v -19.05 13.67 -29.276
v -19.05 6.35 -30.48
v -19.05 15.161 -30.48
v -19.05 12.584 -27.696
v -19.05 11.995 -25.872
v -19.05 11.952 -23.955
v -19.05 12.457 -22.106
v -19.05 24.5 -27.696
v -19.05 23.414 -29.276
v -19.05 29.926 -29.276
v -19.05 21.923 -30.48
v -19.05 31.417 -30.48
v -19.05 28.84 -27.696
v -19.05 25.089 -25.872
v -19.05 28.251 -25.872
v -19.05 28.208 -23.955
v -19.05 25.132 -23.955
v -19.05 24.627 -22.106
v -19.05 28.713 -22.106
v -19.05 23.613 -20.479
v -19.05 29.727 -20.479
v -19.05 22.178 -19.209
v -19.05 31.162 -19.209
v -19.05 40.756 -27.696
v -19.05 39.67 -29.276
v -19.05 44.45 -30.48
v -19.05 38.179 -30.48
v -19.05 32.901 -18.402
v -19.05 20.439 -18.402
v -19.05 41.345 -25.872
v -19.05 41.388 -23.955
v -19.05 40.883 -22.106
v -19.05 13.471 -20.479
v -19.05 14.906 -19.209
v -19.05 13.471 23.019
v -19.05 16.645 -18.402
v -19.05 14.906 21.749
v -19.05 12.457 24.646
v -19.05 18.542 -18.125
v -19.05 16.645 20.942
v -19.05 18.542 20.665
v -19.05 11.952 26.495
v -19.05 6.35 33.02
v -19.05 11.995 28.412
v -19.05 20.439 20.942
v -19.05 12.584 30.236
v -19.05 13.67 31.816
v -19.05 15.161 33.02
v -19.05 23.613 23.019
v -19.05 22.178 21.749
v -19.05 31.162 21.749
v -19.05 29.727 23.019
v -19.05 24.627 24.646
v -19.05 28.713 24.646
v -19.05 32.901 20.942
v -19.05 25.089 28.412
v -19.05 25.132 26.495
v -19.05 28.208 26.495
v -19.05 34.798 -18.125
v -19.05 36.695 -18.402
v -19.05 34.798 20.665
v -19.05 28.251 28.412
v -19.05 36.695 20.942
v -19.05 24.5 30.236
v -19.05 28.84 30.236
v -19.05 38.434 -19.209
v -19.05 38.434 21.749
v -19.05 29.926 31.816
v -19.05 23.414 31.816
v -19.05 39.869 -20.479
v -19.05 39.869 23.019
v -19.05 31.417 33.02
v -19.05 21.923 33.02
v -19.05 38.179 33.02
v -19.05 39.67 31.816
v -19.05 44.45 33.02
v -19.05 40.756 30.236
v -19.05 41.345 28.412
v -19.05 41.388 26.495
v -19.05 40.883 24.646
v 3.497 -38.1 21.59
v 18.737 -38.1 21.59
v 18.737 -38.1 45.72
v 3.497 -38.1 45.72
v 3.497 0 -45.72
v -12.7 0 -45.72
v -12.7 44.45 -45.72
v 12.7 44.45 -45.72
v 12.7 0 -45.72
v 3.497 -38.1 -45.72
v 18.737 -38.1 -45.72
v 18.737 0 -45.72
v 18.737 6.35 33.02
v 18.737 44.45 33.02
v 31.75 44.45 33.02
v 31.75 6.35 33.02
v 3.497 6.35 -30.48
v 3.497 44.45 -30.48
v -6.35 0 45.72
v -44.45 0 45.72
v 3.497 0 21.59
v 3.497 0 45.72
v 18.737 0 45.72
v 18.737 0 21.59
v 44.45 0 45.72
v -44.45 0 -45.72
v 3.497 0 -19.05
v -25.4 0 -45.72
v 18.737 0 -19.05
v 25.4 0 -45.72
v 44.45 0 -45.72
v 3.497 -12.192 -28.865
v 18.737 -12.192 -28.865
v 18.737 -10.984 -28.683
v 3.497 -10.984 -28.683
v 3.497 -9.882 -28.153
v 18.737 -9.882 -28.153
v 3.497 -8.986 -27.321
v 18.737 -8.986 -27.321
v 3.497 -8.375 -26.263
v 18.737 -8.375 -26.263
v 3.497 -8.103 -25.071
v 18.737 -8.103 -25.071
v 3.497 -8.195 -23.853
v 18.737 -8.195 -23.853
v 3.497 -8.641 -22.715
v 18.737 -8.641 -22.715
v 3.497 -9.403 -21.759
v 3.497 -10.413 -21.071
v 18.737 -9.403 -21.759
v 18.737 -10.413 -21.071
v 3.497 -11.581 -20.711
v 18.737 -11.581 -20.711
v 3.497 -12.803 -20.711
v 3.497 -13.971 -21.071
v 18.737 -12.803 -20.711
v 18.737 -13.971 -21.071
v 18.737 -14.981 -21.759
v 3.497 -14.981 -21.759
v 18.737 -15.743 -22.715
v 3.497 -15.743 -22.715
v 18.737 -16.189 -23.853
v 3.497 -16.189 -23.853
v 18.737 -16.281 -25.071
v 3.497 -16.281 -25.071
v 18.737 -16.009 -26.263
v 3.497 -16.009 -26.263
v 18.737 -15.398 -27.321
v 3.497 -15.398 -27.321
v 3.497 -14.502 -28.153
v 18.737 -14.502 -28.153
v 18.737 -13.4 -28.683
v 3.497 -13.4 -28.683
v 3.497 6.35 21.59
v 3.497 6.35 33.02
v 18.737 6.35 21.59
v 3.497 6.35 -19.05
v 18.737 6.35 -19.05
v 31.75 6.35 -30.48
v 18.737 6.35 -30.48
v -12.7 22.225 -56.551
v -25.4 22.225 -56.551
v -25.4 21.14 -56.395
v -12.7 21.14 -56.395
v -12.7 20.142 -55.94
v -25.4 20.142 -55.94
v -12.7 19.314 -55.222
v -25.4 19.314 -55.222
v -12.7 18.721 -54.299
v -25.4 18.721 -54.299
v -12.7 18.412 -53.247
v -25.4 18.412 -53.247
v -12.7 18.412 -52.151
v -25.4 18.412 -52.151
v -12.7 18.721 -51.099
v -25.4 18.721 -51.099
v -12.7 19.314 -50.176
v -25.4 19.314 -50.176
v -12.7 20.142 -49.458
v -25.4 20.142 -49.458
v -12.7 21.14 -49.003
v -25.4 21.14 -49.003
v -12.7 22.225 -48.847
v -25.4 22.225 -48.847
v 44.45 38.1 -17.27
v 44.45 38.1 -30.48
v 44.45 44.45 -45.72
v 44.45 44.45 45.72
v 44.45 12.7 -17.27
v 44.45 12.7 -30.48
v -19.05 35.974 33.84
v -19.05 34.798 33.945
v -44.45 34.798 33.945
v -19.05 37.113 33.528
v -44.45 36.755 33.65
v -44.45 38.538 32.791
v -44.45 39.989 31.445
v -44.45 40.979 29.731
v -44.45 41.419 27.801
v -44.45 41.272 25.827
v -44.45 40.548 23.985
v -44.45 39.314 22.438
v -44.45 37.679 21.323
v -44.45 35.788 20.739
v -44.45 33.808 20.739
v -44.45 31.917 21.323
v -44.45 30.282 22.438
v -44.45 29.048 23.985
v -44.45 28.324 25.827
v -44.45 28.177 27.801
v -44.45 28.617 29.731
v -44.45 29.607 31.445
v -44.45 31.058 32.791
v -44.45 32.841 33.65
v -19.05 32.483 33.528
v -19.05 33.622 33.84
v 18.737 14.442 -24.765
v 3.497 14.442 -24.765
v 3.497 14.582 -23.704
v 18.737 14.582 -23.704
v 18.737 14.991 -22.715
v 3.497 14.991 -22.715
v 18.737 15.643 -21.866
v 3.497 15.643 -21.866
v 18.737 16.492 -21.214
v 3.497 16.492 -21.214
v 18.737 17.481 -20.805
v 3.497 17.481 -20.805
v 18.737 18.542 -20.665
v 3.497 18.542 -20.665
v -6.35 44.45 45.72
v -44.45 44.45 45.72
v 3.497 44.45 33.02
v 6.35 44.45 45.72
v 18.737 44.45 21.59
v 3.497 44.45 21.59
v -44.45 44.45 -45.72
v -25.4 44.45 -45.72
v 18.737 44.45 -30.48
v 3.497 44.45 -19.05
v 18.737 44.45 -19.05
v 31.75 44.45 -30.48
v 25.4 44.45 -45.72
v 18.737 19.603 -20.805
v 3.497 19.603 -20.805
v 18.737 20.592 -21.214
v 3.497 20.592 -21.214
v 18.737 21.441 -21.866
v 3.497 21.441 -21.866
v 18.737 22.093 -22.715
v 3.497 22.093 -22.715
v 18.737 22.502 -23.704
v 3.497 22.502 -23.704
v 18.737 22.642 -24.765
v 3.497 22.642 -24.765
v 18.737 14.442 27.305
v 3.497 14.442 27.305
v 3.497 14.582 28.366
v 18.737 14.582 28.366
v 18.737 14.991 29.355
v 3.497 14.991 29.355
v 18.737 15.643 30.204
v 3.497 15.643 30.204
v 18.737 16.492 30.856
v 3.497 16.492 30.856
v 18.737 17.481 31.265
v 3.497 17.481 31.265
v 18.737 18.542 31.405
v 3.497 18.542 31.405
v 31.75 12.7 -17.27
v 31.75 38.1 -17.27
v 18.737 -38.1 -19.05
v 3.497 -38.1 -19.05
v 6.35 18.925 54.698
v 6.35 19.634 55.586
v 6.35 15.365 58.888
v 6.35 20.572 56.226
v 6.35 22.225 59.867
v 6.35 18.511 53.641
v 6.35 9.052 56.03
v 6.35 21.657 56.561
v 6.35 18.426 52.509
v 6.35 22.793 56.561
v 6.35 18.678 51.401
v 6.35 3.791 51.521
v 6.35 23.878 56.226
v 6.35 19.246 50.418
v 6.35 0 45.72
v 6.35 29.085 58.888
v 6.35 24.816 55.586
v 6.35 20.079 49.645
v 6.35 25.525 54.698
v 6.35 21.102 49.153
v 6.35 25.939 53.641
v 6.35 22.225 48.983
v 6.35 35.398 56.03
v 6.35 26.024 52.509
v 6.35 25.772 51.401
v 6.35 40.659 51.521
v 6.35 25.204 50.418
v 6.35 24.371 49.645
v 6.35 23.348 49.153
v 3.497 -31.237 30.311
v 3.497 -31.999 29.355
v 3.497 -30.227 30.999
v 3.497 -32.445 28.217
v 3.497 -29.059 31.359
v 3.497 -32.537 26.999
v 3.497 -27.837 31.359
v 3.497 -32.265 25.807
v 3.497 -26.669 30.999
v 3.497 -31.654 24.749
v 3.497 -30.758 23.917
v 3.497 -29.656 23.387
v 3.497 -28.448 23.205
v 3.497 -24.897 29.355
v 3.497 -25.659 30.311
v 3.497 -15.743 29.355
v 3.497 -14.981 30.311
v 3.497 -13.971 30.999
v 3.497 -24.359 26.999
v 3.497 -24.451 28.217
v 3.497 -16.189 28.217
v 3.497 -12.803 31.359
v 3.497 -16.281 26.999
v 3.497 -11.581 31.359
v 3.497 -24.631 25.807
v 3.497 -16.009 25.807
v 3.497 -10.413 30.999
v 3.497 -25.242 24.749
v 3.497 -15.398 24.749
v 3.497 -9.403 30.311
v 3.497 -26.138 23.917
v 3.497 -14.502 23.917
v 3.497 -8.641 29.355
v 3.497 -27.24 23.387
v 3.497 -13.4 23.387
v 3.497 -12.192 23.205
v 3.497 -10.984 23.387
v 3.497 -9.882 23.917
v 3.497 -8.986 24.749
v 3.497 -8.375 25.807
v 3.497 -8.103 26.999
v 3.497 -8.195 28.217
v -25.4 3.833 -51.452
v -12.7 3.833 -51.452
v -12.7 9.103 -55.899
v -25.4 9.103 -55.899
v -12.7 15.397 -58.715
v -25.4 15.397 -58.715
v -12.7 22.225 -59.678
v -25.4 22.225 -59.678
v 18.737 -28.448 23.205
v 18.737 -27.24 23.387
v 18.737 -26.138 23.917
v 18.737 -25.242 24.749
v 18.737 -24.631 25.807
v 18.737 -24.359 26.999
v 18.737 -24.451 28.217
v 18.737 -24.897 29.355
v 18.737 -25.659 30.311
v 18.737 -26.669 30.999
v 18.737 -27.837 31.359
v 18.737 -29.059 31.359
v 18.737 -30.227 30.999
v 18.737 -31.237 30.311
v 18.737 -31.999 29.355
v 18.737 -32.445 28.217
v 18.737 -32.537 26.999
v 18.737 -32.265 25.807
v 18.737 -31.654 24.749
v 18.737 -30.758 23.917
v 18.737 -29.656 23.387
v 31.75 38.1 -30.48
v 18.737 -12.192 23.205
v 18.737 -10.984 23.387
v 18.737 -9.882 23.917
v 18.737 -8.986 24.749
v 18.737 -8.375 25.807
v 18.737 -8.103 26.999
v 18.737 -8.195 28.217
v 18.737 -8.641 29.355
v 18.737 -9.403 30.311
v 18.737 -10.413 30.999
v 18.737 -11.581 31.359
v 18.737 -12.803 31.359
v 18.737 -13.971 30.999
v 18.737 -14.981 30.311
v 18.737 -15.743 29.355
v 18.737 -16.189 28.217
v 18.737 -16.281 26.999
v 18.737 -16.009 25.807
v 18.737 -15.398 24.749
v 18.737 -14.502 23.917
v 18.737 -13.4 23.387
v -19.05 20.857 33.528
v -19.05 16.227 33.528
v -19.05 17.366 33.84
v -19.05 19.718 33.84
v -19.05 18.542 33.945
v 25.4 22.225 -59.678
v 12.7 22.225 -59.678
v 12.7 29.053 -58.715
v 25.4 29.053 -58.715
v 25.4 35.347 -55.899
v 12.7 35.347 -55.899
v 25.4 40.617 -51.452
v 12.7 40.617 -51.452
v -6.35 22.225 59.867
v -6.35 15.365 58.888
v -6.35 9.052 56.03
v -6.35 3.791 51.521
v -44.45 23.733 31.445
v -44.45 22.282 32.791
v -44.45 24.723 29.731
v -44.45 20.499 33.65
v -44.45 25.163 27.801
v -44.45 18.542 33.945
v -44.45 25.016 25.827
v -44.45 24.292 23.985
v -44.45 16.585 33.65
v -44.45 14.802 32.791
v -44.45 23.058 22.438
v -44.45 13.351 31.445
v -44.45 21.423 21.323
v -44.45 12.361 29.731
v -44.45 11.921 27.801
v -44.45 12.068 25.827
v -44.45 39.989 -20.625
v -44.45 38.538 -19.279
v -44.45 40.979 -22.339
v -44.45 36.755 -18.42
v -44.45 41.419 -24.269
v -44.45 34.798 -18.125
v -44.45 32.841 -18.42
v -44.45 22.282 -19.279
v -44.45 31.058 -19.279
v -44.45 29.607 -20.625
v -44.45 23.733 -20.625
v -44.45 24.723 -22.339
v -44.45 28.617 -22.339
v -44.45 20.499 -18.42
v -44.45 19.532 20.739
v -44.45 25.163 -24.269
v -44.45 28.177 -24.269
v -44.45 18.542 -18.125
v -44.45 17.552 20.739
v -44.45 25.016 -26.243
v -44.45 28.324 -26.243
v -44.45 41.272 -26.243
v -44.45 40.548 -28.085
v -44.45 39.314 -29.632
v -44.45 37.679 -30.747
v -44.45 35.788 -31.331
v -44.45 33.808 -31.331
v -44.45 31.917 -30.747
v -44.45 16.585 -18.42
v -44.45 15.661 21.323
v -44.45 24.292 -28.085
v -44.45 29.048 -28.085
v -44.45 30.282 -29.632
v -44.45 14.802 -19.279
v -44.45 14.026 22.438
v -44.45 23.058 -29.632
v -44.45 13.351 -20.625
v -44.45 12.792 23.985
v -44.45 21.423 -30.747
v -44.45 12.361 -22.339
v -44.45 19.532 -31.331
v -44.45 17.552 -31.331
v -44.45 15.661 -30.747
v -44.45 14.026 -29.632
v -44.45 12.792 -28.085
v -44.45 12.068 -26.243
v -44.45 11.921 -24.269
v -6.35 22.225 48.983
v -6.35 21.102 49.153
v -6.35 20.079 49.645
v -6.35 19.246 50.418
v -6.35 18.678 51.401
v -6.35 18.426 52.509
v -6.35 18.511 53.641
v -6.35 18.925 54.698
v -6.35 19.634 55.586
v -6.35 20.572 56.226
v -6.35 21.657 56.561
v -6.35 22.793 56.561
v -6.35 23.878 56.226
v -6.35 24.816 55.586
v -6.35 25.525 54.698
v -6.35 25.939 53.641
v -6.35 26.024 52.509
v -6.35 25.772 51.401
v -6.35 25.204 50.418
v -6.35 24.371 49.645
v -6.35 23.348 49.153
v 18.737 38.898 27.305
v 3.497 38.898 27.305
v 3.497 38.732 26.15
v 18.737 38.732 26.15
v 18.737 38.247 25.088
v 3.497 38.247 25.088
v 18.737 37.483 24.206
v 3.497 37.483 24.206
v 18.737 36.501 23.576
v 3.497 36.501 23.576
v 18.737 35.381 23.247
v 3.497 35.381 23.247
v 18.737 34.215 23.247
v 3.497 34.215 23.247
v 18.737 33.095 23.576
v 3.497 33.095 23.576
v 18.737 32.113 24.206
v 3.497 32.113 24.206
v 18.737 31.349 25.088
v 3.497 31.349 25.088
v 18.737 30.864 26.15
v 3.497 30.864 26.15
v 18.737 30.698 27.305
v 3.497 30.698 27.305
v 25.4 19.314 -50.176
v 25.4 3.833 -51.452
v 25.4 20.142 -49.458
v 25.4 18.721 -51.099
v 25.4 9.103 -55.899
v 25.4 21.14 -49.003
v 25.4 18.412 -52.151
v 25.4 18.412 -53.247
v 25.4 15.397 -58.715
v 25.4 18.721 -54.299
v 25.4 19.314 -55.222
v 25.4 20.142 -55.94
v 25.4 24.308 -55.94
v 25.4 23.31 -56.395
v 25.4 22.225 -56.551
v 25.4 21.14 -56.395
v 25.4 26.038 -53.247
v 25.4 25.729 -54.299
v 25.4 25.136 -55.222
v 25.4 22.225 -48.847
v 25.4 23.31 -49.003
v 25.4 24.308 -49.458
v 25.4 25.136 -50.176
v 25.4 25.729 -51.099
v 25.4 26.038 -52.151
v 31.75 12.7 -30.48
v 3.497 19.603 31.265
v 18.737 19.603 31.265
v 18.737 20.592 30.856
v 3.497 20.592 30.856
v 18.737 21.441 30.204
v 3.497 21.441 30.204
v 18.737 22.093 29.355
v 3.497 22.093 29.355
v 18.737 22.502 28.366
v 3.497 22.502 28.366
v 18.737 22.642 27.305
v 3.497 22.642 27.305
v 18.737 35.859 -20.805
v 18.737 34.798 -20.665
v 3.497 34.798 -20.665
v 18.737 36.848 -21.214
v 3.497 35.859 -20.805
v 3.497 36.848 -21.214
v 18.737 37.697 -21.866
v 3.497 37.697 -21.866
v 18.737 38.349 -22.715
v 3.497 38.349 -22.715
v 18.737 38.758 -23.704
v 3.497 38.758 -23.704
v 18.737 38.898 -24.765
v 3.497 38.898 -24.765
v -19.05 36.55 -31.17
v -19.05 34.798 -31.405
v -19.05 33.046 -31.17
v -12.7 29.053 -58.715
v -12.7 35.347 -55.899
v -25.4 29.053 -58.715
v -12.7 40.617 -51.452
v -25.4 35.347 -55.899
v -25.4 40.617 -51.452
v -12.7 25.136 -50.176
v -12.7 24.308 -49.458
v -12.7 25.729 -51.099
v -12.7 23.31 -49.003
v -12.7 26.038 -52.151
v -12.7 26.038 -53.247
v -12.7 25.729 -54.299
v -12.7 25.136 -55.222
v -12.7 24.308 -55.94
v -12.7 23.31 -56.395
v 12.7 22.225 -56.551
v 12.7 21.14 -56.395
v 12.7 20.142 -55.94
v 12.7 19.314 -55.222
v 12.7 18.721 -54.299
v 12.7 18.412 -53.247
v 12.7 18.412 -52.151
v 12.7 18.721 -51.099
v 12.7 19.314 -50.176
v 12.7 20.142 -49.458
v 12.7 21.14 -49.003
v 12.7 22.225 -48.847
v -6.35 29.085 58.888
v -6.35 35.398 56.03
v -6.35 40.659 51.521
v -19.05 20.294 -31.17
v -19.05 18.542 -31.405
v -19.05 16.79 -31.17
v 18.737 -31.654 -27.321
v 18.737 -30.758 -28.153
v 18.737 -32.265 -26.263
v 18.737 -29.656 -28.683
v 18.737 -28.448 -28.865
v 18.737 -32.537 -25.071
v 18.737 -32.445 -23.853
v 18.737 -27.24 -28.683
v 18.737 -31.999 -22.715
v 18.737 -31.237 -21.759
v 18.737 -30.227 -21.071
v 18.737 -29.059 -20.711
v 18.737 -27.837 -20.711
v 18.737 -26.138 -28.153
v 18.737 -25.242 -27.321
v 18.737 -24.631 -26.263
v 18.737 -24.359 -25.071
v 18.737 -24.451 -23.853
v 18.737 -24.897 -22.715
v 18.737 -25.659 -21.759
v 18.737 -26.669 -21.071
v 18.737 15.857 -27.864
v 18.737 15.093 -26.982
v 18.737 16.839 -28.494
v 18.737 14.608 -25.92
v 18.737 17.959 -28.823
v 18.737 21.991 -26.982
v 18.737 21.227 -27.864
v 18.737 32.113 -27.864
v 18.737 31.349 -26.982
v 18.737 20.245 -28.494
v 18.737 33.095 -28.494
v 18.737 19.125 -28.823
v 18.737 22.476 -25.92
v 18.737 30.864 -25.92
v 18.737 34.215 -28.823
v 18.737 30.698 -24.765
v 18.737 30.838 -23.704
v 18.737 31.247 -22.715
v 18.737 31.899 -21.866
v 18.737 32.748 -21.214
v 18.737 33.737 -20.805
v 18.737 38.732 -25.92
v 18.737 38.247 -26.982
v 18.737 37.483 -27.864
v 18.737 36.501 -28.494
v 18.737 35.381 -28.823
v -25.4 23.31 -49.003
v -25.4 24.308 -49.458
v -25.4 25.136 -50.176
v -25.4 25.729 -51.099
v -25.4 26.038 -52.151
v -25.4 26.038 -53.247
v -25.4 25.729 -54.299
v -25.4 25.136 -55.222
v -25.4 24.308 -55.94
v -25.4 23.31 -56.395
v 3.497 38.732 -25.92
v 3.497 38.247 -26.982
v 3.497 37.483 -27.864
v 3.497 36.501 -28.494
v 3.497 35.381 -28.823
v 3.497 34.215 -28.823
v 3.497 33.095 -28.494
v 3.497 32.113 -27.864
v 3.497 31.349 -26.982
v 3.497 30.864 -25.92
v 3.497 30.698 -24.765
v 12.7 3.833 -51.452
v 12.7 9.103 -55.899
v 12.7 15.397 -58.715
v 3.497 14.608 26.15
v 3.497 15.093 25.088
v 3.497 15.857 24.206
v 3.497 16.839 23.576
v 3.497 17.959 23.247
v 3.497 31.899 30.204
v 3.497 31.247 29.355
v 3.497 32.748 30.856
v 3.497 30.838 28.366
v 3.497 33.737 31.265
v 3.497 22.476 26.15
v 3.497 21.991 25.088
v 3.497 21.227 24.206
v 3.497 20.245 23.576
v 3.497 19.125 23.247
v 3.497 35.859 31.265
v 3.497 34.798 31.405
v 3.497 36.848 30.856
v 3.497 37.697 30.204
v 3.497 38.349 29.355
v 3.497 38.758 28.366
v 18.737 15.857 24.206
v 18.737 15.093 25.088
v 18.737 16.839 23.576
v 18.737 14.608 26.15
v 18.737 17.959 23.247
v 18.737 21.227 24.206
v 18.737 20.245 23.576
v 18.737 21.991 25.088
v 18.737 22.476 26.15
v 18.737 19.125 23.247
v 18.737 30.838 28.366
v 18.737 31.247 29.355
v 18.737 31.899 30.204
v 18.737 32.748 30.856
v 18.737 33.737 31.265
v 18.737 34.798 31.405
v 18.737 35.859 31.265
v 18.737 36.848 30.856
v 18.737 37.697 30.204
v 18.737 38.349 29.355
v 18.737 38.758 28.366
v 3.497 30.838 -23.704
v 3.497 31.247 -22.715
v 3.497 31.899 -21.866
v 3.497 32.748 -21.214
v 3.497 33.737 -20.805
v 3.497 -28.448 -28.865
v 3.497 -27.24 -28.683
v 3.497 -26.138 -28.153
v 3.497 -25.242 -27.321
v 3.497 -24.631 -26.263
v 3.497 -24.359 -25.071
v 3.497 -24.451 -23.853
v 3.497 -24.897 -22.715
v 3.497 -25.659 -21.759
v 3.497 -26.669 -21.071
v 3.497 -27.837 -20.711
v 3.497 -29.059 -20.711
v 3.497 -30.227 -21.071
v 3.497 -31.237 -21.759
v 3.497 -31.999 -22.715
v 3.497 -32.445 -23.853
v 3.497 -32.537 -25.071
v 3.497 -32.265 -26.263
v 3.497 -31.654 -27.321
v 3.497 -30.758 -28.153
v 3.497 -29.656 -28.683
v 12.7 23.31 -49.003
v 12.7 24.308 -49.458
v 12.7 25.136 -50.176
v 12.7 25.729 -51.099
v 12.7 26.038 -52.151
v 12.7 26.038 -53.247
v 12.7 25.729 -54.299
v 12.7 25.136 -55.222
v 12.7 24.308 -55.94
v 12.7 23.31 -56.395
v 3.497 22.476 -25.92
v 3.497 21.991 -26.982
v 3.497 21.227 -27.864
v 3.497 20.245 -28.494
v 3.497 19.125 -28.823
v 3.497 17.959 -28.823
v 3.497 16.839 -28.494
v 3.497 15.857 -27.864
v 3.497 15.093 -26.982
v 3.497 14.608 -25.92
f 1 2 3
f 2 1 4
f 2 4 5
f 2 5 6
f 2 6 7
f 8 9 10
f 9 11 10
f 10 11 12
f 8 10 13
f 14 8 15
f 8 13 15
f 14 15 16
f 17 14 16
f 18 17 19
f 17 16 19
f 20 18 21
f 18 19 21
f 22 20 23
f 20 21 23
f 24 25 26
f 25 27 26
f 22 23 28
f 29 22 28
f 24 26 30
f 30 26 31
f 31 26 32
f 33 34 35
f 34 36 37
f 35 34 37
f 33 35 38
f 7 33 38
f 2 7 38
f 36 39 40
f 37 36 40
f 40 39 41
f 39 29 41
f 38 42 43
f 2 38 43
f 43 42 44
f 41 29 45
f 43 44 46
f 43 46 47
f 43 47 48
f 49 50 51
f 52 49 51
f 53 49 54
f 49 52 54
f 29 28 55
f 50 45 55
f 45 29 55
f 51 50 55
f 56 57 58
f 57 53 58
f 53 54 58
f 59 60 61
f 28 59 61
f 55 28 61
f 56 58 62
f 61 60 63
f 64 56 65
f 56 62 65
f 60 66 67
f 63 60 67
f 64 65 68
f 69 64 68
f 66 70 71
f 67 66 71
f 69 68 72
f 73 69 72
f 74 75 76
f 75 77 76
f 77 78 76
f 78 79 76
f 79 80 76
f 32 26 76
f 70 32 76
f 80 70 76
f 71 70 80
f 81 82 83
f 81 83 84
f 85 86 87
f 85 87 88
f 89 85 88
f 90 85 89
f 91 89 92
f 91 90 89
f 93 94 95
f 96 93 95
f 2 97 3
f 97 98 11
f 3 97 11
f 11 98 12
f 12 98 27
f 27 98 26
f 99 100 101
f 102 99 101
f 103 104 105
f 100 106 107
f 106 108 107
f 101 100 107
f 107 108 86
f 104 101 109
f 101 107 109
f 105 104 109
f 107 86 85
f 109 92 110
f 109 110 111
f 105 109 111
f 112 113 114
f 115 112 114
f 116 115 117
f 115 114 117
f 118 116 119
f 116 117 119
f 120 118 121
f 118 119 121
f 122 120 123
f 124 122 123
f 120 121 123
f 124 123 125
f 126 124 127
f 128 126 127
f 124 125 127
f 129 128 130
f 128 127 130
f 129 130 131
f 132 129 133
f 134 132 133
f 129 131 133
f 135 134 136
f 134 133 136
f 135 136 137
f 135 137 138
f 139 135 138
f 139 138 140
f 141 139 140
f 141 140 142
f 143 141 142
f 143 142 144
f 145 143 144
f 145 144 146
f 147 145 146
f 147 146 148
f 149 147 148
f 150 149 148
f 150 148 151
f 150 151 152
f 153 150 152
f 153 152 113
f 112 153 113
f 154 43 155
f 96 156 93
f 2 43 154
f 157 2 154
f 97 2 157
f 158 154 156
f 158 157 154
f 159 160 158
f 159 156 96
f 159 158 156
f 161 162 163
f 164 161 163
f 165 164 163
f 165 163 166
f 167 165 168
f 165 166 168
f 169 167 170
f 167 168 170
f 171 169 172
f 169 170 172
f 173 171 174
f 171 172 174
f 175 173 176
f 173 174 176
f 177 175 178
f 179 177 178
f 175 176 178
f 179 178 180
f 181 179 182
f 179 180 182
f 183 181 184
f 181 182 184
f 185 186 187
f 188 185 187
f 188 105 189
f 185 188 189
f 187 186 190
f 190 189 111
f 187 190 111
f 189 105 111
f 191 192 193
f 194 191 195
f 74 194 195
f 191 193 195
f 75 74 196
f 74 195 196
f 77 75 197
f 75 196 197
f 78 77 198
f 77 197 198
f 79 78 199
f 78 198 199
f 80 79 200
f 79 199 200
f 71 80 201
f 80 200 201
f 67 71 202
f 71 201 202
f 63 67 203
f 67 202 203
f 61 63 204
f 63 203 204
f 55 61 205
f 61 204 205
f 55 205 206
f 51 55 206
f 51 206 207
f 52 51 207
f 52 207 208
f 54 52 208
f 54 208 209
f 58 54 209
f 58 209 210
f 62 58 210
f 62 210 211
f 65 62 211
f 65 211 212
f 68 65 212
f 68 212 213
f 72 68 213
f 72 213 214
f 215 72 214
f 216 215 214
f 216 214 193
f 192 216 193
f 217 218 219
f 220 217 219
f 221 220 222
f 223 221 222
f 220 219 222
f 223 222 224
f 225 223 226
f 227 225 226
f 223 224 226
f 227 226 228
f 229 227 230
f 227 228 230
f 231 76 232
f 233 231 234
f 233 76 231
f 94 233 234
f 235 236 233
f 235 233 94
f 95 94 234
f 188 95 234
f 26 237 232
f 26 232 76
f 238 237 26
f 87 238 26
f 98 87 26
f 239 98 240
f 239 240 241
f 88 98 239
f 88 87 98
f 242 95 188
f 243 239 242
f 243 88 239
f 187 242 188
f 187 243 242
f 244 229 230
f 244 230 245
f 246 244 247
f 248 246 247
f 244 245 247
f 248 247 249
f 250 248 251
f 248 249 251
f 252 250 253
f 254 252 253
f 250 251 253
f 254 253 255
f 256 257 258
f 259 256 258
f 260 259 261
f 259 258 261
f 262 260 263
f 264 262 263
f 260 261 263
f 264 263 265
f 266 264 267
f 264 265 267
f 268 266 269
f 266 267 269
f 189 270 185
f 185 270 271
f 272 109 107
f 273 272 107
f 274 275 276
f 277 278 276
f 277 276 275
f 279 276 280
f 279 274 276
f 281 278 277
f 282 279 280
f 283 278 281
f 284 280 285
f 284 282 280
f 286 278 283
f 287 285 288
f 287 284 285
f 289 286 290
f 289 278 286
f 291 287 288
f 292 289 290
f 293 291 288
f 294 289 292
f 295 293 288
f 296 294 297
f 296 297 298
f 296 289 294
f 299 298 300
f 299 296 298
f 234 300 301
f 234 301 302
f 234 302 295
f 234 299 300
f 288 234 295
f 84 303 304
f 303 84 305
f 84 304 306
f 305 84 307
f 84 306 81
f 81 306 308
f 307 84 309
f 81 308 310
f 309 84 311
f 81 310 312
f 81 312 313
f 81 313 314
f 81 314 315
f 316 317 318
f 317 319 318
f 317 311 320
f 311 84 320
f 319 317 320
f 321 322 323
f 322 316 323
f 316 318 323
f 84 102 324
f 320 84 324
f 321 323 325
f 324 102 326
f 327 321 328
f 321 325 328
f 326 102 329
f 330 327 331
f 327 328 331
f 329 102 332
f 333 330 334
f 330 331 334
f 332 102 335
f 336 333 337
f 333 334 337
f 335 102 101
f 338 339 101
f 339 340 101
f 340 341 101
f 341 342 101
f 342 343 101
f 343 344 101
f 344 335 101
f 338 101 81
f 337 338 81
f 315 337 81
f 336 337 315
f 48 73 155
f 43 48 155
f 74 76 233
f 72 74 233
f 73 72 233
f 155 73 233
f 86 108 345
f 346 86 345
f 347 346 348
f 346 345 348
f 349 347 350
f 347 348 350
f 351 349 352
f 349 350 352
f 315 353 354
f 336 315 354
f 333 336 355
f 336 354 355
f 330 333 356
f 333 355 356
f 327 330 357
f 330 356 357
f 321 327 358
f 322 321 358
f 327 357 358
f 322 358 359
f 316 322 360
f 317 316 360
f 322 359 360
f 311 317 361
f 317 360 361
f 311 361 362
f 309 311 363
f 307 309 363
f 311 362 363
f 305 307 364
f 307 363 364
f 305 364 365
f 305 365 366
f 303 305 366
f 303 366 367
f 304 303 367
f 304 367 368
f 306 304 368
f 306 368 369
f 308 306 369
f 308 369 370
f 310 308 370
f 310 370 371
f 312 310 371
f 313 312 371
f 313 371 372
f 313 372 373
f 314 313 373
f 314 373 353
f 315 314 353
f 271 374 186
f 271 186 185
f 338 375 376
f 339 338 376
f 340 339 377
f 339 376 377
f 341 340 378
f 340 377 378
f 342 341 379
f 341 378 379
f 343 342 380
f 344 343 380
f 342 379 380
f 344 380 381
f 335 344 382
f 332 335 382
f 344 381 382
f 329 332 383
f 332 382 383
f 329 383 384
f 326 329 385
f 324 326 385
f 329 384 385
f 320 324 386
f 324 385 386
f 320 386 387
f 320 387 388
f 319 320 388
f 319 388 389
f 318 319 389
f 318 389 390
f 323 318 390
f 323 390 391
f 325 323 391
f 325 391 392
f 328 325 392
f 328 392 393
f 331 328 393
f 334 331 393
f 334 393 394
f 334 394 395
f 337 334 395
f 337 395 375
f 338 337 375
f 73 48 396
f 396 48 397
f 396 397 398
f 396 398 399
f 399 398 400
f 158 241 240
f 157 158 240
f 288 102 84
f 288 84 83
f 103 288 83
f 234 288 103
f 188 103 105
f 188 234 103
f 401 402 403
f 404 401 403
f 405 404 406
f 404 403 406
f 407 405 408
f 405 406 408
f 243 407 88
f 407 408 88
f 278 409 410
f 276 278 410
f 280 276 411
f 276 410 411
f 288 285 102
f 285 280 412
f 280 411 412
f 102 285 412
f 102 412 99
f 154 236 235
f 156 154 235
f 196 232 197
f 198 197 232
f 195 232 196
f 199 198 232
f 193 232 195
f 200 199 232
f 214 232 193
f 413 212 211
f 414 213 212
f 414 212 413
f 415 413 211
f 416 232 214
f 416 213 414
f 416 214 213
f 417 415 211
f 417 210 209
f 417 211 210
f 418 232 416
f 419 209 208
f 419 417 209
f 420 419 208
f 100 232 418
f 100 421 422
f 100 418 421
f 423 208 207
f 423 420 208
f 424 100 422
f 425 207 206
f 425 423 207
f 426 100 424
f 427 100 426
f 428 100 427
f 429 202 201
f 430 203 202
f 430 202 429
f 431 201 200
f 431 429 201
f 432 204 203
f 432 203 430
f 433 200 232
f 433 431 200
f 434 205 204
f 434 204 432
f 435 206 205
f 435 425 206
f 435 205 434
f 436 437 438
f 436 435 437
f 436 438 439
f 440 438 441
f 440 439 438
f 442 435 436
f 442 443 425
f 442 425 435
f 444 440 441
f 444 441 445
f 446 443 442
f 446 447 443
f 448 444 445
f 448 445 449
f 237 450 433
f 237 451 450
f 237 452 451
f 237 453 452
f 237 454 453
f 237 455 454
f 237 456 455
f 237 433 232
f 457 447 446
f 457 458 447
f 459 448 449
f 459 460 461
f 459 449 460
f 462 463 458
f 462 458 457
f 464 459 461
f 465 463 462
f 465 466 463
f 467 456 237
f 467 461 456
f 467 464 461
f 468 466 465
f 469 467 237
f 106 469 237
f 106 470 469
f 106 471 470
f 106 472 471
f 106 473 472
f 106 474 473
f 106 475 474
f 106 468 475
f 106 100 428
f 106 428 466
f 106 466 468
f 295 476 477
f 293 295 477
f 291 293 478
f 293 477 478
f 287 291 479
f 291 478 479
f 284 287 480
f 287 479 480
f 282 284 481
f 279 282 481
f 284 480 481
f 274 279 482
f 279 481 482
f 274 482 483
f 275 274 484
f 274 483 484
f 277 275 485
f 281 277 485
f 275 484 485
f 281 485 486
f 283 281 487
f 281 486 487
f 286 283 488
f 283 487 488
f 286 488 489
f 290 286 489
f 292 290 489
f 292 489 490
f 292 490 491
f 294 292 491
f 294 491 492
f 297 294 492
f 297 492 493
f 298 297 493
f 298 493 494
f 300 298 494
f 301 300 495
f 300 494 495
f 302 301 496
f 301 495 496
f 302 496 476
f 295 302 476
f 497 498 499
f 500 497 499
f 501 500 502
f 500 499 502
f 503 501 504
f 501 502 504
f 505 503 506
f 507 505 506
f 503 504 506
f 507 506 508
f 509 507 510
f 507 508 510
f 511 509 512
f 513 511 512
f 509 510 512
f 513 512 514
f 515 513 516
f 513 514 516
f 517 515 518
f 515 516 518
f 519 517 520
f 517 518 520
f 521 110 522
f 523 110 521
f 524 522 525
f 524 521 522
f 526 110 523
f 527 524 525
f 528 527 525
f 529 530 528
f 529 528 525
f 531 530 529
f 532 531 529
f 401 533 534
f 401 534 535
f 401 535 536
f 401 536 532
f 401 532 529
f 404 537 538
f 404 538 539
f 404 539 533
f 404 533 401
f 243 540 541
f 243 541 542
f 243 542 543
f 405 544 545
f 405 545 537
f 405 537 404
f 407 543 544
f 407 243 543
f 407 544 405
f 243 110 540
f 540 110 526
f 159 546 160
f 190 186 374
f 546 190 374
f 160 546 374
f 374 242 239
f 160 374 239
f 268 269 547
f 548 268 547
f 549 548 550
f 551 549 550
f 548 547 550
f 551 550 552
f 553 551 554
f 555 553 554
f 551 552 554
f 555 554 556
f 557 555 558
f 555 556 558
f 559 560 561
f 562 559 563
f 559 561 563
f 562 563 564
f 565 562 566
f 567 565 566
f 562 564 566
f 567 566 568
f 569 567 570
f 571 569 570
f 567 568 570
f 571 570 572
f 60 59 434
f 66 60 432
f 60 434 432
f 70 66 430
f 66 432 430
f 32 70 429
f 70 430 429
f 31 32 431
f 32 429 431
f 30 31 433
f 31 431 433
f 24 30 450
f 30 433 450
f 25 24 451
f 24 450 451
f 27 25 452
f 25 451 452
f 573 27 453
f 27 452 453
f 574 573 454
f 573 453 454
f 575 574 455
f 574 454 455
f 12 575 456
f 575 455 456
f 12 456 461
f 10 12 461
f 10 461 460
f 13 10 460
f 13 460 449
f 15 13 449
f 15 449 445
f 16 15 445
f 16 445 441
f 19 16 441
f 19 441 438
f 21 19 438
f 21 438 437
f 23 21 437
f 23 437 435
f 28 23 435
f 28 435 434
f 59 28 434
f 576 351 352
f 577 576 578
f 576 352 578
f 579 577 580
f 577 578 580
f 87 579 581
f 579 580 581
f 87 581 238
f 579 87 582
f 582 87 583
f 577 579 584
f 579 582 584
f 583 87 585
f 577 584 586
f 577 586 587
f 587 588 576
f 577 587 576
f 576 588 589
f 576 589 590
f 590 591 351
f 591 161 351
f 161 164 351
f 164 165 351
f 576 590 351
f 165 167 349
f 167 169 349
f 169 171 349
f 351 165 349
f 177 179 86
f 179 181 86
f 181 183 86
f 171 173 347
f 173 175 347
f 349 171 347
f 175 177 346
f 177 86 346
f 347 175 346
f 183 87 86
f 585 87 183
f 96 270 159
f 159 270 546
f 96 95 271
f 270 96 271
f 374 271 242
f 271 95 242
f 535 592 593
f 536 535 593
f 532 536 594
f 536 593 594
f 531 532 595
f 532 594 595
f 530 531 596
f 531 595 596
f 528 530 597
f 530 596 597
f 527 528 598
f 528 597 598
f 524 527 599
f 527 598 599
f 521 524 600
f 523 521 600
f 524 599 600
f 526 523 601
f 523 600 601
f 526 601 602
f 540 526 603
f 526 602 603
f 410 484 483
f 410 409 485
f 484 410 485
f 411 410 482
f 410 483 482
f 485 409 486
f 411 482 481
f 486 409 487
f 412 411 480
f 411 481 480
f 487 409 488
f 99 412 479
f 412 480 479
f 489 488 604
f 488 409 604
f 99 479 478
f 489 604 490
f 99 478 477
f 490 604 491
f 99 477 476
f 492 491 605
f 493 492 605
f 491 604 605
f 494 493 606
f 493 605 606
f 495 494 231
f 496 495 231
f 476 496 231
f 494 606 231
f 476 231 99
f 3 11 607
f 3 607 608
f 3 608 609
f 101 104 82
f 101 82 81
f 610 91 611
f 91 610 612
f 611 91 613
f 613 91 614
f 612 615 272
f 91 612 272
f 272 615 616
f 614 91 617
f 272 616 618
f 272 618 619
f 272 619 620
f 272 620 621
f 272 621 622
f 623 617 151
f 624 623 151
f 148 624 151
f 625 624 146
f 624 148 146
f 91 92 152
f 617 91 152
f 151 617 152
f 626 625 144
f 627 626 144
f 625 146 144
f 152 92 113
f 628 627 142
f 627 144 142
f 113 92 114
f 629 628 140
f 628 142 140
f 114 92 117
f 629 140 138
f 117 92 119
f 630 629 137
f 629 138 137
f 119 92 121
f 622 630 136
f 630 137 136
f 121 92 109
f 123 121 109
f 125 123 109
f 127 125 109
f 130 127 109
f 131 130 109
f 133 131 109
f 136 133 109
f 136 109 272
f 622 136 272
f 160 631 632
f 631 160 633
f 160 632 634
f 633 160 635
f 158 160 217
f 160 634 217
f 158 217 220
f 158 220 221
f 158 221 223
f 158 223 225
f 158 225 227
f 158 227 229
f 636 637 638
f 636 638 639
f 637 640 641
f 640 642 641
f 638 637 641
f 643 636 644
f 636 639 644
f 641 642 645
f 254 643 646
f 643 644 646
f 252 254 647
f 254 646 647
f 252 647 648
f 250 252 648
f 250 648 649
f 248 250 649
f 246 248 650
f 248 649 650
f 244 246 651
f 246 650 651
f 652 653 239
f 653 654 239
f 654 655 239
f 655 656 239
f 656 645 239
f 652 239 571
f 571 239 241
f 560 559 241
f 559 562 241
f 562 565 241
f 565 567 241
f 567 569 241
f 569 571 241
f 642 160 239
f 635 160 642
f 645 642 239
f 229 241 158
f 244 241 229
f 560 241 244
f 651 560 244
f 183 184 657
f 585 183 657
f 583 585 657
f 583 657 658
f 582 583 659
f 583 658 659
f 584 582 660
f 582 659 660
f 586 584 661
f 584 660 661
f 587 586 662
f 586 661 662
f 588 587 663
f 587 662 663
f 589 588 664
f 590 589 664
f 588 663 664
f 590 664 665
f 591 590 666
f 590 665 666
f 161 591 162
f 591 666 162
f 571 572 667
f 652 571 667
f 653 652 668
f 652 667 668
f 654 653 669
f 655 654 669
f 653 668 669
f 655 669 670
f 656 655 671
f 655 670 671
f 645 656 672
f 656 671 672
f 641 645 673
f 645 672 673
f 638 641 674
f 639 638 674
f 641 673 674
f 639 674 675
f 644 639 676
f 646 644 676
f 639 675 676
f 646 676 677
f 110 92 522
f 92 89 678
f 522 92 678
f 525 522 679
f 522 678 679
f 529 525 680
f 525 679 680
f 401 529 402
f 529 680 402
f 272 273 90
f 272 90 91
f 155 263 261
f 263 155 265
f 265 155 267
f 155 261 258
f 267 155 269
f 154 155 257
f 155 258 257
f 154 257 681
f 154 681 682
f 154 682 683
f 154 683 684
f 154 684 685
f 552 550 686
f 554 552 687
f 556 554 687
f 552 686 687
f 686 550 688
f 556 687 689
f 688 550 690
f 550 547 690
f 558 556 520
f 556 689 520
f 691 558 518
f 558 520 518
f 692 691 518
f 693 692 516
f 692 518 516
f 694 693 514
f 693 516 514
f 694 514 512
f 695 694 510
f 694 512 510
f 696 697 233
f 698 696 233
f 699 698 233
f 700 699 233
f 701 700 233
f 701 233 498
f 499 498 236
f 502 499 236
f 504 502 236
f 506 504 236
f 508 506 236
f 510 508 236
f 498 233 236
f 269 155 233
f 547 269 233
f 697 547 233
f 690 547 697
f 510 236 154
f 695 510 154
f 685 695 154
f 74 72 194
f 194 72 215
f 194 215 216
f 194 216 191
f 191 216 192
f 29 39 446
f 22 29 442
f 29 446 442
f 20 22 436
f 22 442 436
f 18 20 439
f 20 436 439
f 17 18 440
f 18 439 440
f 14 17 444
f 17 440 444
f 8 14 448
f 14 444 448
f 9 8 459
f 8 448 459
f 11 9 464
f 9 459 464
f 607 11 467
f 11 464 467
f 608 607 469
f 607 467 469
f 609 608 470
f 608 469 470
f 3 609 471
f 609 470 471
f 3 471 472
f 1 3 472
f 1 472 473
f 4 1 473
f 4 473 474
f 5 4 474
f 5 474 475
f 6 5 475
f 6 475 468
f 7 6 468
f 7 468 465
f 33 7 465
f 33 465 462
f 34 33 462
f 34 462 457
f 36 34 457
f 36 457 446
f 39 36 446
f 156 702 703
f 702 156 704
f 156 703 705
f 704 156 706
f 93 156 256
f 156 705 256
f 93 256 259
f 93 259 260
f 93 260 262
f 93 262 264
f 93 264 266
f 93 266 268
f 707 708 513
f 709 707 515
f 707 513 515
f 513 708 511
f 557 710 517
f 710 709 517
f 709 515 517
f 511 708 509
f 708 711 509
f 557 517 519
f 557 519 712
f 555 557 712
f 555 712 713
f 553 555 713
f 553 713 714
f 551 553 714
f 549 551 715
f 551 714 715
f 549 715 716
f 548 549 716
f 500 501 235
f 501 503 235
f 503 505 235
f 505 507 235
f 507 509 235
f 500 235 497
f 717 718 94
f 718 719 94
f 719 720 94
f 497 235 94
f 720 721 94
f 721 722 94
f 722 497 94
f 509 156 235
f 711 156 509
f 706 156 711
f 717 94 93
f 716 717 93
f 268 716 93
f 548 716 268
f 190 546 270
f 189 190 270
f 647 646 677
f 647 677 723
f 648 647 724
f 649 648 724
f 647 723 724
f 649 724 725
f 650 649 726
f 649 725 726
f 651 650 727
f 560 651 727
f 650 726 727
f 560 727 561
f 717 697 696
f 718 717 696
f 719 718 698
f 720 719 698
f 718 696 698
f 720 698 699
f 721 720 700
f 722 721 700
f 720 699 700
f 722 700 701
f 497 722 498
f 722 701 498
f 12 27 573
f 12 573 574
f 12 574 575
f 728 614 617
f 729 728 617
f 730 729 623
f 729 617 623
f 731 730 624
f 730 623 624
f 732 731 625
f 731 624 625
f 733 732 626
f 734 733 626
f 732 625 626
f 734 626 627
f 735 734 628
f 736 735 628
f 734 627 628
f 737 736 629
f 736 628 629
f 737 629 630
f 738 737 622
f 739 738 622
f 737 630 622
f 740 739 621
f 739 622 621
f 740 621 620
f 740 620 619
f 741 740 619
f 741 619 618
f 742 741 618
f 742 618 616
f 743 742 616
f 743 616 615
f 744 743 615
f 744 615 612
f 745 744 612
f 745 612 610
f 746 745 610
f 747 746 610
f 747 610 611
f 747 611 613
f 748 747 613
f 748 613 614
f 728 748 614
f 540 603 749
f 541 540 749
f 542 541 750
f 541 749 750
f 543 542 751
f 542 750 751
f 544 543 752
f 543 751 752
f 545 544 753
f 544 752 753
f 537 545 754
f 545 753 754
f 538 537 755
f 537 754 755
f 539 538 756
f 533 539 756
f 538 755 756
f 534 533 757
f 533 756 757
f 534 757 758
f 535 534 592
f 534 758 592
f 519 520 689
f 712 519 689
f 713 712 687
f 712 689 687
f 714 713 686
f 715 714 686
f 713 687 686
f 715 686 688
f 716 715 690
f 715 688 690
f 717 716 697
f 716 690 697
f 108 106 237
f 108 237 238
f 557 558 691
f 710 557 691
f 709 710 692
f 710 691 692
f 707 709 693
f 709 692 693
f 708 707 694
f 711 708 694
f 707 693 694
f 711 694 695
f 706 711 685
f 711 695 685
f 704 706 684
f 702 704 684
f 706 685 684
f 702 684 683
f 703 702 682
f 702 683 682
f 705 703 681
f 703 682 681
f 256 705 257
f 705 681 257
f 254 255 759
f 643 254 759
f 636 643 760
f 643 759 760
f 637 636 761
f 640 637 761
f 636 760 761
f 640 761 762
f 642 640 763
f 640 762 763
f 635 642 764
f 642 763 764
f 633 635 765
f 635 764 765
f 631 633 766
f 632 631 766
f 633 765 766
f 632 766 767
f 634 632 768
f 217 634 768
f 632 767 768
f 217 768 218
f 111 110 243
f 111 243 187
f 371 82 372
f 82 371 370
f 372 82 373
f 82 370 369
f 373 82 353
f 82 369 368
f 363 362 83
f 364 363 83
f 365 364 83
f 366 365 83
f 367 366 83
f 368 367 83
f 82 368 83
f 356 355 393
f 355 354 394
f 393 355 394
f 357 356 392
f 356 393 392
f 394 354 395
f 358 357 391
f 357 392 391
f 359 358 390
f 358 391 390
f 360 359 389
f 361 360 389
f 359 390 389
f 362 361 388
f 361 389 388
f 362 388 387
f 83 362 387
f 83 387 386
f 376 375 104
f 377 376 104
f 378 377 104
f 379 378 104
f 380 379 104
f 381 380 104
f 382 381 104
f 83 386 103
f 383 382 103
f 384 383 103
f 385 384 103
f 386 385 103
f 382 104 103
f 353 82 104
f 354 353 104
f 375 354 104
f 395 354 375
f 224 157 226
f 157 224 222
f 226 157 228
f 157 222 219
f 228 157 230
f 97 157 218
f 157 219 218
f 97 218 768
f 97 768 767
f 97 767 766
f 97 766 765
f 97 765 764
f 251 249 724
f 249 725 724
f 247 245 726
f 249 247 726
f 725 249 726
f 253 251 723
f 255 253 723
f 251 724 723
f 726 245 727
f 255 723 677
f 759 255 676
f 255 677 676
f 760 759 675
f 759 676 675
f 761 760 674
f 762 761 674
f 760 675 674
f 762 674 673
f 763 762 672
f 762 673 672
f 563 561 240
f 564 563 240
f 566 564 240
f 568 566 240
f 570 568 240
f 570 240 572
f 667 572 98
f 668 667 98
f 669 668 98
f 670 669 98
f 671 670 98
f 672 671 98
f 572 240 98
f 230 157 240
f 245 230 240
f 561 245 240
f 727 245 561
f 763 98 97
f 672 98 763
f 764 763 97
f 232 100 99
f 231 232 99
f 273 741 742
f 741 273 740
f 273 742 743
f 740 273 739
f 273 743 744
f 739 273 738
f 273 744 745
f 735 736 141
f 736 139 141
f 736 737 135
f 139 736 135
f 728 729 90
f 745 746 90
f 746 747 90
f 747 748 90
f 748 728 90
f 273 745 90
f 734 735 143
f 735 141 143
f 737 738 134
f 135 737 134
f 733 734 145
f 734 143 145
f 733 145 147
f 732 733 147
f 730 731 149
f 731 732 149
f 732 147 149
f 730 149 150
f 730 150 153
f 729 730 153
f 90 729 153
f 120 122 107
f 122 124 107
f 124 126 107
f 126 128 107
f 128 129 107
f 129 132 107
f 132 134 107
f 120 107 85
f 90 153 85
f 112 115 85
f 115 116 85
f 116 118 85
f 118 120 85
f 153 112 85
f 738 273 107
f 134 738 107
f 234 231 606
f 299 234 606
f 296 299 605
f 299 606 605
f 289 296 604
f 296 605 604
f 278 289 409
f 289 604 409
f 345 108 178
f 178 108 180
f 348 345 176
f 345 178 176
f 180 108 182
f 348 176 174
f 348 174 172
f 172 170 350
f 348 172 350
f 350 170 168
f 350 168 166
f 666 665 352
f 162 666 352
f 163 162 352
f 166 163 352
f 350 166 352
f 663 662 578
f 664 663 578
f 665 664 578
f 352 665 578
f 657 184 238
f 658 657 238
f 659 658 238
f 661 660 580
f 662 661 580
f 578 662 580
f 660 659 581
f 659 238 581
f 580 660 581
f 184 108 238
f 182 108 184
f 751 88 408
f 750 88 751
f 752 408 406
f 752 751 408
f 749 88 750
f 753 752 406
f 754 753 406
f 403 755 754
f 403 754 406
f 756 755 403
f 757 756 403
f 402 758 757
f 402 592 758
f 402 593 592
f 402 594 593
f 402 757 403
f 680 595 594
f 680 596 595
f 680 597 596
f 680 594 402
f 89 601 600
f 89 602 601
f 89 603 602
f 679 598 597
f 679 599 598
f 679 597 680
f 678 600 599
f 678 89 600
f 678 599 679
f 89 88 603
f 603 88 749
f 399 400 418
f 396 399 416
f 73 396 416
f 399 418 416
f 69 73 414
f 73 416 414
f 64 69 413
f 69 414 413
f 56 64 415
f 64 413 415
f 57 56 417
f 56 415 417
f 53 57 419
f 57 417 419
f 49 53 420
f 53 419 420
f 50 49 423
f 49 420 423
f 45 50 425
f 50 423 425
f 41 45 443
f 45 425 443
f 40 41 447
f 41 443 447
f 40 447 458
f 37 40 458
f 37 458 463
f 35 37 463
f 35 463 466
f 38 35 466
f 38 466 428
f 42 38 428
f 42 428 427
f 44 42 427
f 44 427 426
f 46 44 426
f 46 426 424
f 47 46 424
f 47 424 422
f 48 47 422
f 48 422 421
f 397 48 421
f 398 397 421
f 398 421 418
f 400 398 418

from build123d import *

# Parameters (mm, degrees)
SKETCH1_W                = 88.9
SKETCH1_H                = 91.44
BOSS_EXTRUDE1_DEPTH      = 44.45
CUT_EXTRUDE1_DEPTH       = 38.1
CUT_EXTRUDE2_DEPTH       = 15.24
SKETCH4_R                = 6.64
CUT_EXTRUDE3_DEPTH       = 25.4
SKETCH5_W                = 13.209891204
SKETCH5_H                = 25.4
CUT_EXTRUDE4_DEPTH       = 12.7
BOSS_EXTRUDE2_DEPTH      = 25.4
BOSS_EXTRUDE2_DEPTH_BACK = 25.4
CUT_EXTRUDE6_DEPTH       = 45.72
CUT_EXTRUDE6_DEPTH_BACK  = 2.54
SKETCH9_W                = 12.7
SKETCH9_H                = 18.221589608
BOSS_EXTRUDE4_DEPTH      = 6.35
BOSS_EXTRUDE4_DEPTH_BACK = 6.35
BOSS_EXTRUDE6_DEPTH      = 38.1
SKETCH12_R               = 4.1
CUT_EXTRUDE7_DEPTH       = 98.736331214


with BuildPart() as part:
    # Sketch1 → Boss-Extrude1 (new body)
    with BuildSketch(Plane(origin=(0, 0, 0), x_dir=(1, 0, 0), z_dir=(0, 1, 0))):
        Rectangle(SKETCH1_W, SKETCH1_H)
    extrude(amount=BOSS_EXTRUDE1_DEPTH)

    # Sketch2 → Cut-Extrude1 (cut)
    with BuildSketch(Plane(origin=(0, 44.45, 0), x_dir=(1, 0, 0), z_dir=(0, 1, 0))):
        Polygon((-19.05, 30.48), (-19.05, -33.02), (3.496943095, -33.02), (3.496943095, -21.59), (18.736943095, -21.59), (18.736943095, -33.02), (31.75, -33.02), (31.75, 30.48), (18.736943095, 30.48), (18.736943095, 19.05), (3.496943095, 19.05), (3.496943095, 30.48), align=None)
    extrude(amount=-CUT_EXTRUDE1_DEPTH, mode=Mode.SUBTRACT)

    # Sketch3 → Cut-Extrude2 (cut)
    with BuildSketch(Plane.ZY.offset(-3.496943095)):
        with BuildLine():
            ThreePointArc((-24.765, 22.642), (-28.865, 18.542), (-24.765, 14.442))
            Line((-24.765, 14.442), (-24.765, 22.642))
        make_face()
        with BuildLine():
            Line((-24.765, 22.642), (-24.765, 14.442))
            ThreePointArc((-24.765, 14.442), (-21.865862197, 15.642862197), (-20.665, 18.542))
            ThreePointArc((-20.665, 18.542), (-21.865862197, 21.441137803), (-24.765, 22.642))
        make_face()
        with BuildLine():
            ThreePointArc((-24.765, 22.642), (-28.865, 18.542), (-24.765, 14.442))
            Line((-24.765, 14.442), (-24.765, 22.642))
        make_face()
        with BuildLine():
            Line((-24.765, 22.642), (-24.765, 14.442))
            ThreePointArc((-24.765, 14.442), (-21.865862197, 15.642862197), (-20.665, 18.542))
            ThreePointArc((-20.665, 18.542), (-21.865862197, 21.441137803), (-24.765, 22.642))
        make_face()
        with BuildLine():
            ThreePointArc((-24.765, 38.898), (-28.865, 34.798), (-24.765, 30.698))
            Line((-24.765, 30.698), (-24.765, 38.898))
        make_face()
        with BuildLine():
            Line((-24.765, 38.898), (-24.765, 30.698))
            ThreePointArc((-24.765, 30.698), (-21.865862197, 31.898862197), (-20.665, 34.798))
            ThreePointArc((-20.665, 34.798), (-21.865862197, 37.697137803), (-24.765, 38.898))
        make_face()
        with BuildLine():
            ThreePointArc((-24.765, 38.898), (-28.865, 34.798), (-24.765, 30.698))
            Line((-24.765, 30.698), (-24.765, 38.898))
        make_face()
        with BuildLine():
            Line((-24.765, 38.898), (-24.765, 30.698))
            ThreePointArc((-24.765, 30.698), (-21.865862197, 31.898862197), (-20.665, 34.798))
            ThreePointArc((-20.665, 34.798), (-21.865862197, 37.697137803), (-24.765, 38.898))
        make_face()
        with BuildLine():
            ThreePointArc((27.305, 22.642), (23.205, 18.542), (27.305, 14.442))
            Line((27.305, 14.442), (27.305, 22.642))
        make_face()
        with BuildLine():
            Line((27.305, 22.642), (27.305, 14.442))
            ThreePointArc((27.305, 14.442), (30.204137803, 15.642862197), (31.405, 18.542))
            ThreePointArc((31.405, 18.542), (30.204137803, 21.441137803), (27.305, 22.642))
        make_face()
        with BuildLine():
            ThreePointArc((27.305, 22.642), (23.205, 18.542), (27.305, 14.442))
            Line((27.305, 14.442), (27.305, 22.642))
        make_face()
        with BuildLine():
            Line((27.305, 22.642), (27.305, 14.442))
            ThreePointArc((27.305, 14.442), (30.204137803, 15.642862197), (31.405, 18.542))
            ThreePointArc((31.405, 18.542), (30.204137803, 21.441137803), (27.305, 22.642))
        make_face()
        with BuildLine():
            ThreePointArc((27.305, 38.898), (23.205, 34.798), (27.305, 30.698))
            Line((27.305, 30.698), (27.305, 38.898))
        make_face()
        with BuildLine():
            Line((27.305, 38.898), (27.305, 30.698))
            ThreePointArc((27.305, 30.698), (30.204137803, 31.898862197), (31.405, 34.798))
            ThreePointArc((31.405, 34.798), (30.204137803, 37.697137803), (27.305, 38.898))
        make_face()
        with BuildLine():
            ThreePointArc((27.305, 38.898), (23.205, 34.798), (27.305, 30.698))
            Line((27.305, 30.698), (27.305, 38.898))
        make_face()
        with BuildLine():
            Line((27.305, 38.898), (27.305, 30.698))
            ThreePointArc((27.305, 30.698), (30.204137803, 31.898862197), (31.405, 34.798))
            ThreePointArc((31.405, 34.798), (30.204137803, 37.697137803), (27.305, 38.898))
        make_face()
    extrude(amount=-CUT_EXTRUDE2_DEPTH, mode=Mode.SUBTRACT)

    # Sketch4 → Cut-Extrude3 (cut)
    with BuildSketch(Plane.ZY.offset(44.45)):
        with Locations((-24.765, 18.542)):
            Circle(SKETCH4_R)
        with Locations((-24.765, 34.798)):
            Circle(SKETCH4_R)
        with Locations((27.305, 18.542)):
            Circle(SKETCH4_R)
        with Locations((27.305, 34.798)):
            Circle(SKETCH4_R)
    extrude(amount=-CUT_EXTRUDE3_DEPTH, mode=Mode.SUBTRACT)

    # Sketch5 → Cut-Extrude4 (cut)
    with BuildSketch(Plane.ZY.offset(-31.75)):
        with Locations((-23.875054398, 25.4)):
            Rectangle(SKETCH5_W, SKETCH5_H)
    extrude(amount=-CUT_EXTRUDE4_DEPTH, mode=Mode.SUBTRACT)

    # Sketch8 → Boss-Extrude2 (add, two sides: drawn at the far end of the back side and taken through both)
    with BuildSketch(Plane(origin=(0, 0, 0), x_dir=(0, 0, -1), z_dir=(1, 0, 0)).offset(-BOSS_EXTRUDE2_DEPTH_BACK)):
        with BuildLine():
            ThreePointArc((48.846831284, 22.225), (52.699055938, 26.077224654), (56.551280591, 22.225))
            Line((56.551280591, 22.225), (59.678111875, 22.225))
            ThreePointArc((59.678111875, 22.225), (55.899195587, 35.347304601), (45.72, 44.45))
            Line((45.72, 44.45), (45.72, 22.225))
            Line((45.72, 22.225), (48.846831284, 22.225))
        make_face()
        with BuildLine():
            Line((59.678111875, 22.225), (56.551280591, 22.225))
            ThreePointArc((56.551280591, 22.225), (52.699055938, 18.372775346), (48.846831284, 22.225))
            Line((48.846831284, 22.225), (45.72, 22.225))
            Line((45.72, 22.225), (45.72, 0))
            ThreePointArc((45.72, 0), (55.899195587, 9.102695399), (59.678111875, 22.225))
        make_face()
        with BuildLine():
            ThreePointArc((48.846831284, 22.225), (52.699055938, 26.077224654), (56.551280591, 22.225))
            Line((56.551280591, 22.225), (59.678111875, 22.225))
            ThreePointArc((59.678111875, 22.225), (55.899195587, 35.347304601), (45.72, 44.45))
            Line((45.72, 44.45), (45.72, 22.225))
            Line((45.72, 22.225), (48.846831284, 22.225))
        make_face()
        with BuildLine():
            Line((59.678111875, 22.225), (56.551280591, 22.225))
            ThreePointArc((56.551280591, 22.225), (52.699055938, 18.372775346), (48.846831284, 22.225))
            Line((48.846831284, 22.225), (45.72, 22.225))
            Line((45.72, 22.225), (45.72, 0))
            ThreePointArc((45.72, 0), (55.899195587, 9.102695399), (59.678111875, 22.225))
        make_face()
    extrude(amount=BOSS_EXTRUDE2_DEPTH + BOSS_EXTRUDE2_DEPTH_BACK)

    # Sketch9 → Cut-Extrude6 (cut, two sides: drawn at the far end of the back side and taken through both)
    with BuildSketch(Plane(origin=(0, 0, 0), x_dir=(1, 0, 0), z_dir=(0, 1, 0)).offset(-CUT_EXTRUDE6_DEPTH_BACK)):
        with Locations((-6.35, 54.830794804)):
            Rectangle(SKETCH9_W, SKETCH9_H)
        with Locations((6.35, 54.830794804)):
            Rectangle(SKETCH9_W, SKETCH9_H)
    extrude(amount=CUT_EXTRUDE6_DEPTH + CUT_EXTRUDE6_DEPTH_BACK, mode=Mode.SUBTRACT)

    # Sketch10 → Boss-Extrude4 (add, two sides: drawn at the far end of the back side and taken through both)
    with BuildSketch(Plane(origin=(0, 0, 0), x_dir=(0, 0, -1), z_dir=(1, 0, 0)).offset(-BOSS_EXTRUDE4_DEPTH_BACK)):
        with BuildLine():
            Line((-45.72, 22.225), (-45.72, 44.45))
            ThreePointArc((-45.72, 44.45), (-56.029860076, 35.397643692), (-59.866502833, 22.225))
            Line((-59.866502833, 22.225), (-56.603251416, 22.225))
            ThreePointArc((-56.603251416, 22.225), (-52.793251416, 26.035), (-48.983251416, 22.225))
            Line((-48.983251416, 22.225), (-45.72, 22.225))
        make_face()
        with BuildLine():
            Line((-45.72, 0), (-45.72, 22.225))
            Line((-45.72, 22.225), (-48.983251416, 22.225))
            ThreePointArc((-48.983251416, 22.225), (-52.793251416, 18.415), (-56.603251416, 22.225))
            Line((-56.603251416, 22.225), (-59.866502833, 22.225))
            ThreePointArc((-59.866502833, 22.225), (-56.029860076, 9.052356308), (-45.72, 0))
        make_face()
        with BuildLine():
            Line((-45.72, 22.225), (-45.72, 44.45))
            ThreePointArc((-45.72, 44.45), (-56.029860076, 35.397643692), (-59.866502833, 22.225))
            Line((-59.866502833, 22.225), (-56.603251416, 22.225))
            ThreePointArc((-56.603251416, 22.225), (-52.793251416, 26.035), (-48.983251416, 22.225))
            Line((-48.983251416, 22.225), (-45.72, 22.225))
        make_face()
        with BuildLine():
            Line((-45.72, 0), (-45.72, 22.225))
            Line((-45.72, 22.225), (-48.983251416, 22.225))
            ThreePointArc((-48.983251416, 22.225), (-52.793251416, 18.415), (-56.603251416, 22.225))
            Line((-56.603251416, 22.225), (-59.866502833, 22.225))
            ThreePointArc((-59.866502833, 22.225), (-56.029860076, 9.052356308), (-45.72, 0))
        make_face()
    extrude(amount=BOSS_EXTRUDE4_DEPTH + BOSS_EXTRUDE4_DEPTH_BACK)

    # Sketch11 → Boss-Extrude6 (add)
    with BuildSketch(Plane.XZ):
        Polygon((18.736943095, 33.02), (18.736943095, 21.59), (3.496943095, 21.59), (3.496943095, 33.02), (3.496943095, 45.72), (18.736943095, 45.72), align=None)
        Polygon((18.736943095, -30.48), (18.736943095, -19.05), (3.496943095, -19.05), (3.496943095, -30.48), (3.496943095, -45.72), (18.736943095, -45.72), align=None)
    extrude(amount=BOSS_EXTRUDE6_DEPTH)

    # Sketch12 → Cut-Extrude7 (cut, through all)
    with BuildSketch(Plane(origin=(18.736943095, 0, 0), x_dir=(0, 0, -1), z_dir=(1, 0, 0))):
        with Locations((24.765, -12.192)):
            Circle(SKETCH12_R)
        with Locations((24.765, -28.448)):
            Circle(SKETCH12_R)
        with Locations((-27.305, -12.192)):
            Circle(SKETCH12_R)
        with Locations((-27.305, -28.448)):
            Circle(SKETCH12_R)
    extrude(amount=-CUT_EXTRUDE7_DEPTH, mode=Mode.SUBTRACT)


solid = part.part
